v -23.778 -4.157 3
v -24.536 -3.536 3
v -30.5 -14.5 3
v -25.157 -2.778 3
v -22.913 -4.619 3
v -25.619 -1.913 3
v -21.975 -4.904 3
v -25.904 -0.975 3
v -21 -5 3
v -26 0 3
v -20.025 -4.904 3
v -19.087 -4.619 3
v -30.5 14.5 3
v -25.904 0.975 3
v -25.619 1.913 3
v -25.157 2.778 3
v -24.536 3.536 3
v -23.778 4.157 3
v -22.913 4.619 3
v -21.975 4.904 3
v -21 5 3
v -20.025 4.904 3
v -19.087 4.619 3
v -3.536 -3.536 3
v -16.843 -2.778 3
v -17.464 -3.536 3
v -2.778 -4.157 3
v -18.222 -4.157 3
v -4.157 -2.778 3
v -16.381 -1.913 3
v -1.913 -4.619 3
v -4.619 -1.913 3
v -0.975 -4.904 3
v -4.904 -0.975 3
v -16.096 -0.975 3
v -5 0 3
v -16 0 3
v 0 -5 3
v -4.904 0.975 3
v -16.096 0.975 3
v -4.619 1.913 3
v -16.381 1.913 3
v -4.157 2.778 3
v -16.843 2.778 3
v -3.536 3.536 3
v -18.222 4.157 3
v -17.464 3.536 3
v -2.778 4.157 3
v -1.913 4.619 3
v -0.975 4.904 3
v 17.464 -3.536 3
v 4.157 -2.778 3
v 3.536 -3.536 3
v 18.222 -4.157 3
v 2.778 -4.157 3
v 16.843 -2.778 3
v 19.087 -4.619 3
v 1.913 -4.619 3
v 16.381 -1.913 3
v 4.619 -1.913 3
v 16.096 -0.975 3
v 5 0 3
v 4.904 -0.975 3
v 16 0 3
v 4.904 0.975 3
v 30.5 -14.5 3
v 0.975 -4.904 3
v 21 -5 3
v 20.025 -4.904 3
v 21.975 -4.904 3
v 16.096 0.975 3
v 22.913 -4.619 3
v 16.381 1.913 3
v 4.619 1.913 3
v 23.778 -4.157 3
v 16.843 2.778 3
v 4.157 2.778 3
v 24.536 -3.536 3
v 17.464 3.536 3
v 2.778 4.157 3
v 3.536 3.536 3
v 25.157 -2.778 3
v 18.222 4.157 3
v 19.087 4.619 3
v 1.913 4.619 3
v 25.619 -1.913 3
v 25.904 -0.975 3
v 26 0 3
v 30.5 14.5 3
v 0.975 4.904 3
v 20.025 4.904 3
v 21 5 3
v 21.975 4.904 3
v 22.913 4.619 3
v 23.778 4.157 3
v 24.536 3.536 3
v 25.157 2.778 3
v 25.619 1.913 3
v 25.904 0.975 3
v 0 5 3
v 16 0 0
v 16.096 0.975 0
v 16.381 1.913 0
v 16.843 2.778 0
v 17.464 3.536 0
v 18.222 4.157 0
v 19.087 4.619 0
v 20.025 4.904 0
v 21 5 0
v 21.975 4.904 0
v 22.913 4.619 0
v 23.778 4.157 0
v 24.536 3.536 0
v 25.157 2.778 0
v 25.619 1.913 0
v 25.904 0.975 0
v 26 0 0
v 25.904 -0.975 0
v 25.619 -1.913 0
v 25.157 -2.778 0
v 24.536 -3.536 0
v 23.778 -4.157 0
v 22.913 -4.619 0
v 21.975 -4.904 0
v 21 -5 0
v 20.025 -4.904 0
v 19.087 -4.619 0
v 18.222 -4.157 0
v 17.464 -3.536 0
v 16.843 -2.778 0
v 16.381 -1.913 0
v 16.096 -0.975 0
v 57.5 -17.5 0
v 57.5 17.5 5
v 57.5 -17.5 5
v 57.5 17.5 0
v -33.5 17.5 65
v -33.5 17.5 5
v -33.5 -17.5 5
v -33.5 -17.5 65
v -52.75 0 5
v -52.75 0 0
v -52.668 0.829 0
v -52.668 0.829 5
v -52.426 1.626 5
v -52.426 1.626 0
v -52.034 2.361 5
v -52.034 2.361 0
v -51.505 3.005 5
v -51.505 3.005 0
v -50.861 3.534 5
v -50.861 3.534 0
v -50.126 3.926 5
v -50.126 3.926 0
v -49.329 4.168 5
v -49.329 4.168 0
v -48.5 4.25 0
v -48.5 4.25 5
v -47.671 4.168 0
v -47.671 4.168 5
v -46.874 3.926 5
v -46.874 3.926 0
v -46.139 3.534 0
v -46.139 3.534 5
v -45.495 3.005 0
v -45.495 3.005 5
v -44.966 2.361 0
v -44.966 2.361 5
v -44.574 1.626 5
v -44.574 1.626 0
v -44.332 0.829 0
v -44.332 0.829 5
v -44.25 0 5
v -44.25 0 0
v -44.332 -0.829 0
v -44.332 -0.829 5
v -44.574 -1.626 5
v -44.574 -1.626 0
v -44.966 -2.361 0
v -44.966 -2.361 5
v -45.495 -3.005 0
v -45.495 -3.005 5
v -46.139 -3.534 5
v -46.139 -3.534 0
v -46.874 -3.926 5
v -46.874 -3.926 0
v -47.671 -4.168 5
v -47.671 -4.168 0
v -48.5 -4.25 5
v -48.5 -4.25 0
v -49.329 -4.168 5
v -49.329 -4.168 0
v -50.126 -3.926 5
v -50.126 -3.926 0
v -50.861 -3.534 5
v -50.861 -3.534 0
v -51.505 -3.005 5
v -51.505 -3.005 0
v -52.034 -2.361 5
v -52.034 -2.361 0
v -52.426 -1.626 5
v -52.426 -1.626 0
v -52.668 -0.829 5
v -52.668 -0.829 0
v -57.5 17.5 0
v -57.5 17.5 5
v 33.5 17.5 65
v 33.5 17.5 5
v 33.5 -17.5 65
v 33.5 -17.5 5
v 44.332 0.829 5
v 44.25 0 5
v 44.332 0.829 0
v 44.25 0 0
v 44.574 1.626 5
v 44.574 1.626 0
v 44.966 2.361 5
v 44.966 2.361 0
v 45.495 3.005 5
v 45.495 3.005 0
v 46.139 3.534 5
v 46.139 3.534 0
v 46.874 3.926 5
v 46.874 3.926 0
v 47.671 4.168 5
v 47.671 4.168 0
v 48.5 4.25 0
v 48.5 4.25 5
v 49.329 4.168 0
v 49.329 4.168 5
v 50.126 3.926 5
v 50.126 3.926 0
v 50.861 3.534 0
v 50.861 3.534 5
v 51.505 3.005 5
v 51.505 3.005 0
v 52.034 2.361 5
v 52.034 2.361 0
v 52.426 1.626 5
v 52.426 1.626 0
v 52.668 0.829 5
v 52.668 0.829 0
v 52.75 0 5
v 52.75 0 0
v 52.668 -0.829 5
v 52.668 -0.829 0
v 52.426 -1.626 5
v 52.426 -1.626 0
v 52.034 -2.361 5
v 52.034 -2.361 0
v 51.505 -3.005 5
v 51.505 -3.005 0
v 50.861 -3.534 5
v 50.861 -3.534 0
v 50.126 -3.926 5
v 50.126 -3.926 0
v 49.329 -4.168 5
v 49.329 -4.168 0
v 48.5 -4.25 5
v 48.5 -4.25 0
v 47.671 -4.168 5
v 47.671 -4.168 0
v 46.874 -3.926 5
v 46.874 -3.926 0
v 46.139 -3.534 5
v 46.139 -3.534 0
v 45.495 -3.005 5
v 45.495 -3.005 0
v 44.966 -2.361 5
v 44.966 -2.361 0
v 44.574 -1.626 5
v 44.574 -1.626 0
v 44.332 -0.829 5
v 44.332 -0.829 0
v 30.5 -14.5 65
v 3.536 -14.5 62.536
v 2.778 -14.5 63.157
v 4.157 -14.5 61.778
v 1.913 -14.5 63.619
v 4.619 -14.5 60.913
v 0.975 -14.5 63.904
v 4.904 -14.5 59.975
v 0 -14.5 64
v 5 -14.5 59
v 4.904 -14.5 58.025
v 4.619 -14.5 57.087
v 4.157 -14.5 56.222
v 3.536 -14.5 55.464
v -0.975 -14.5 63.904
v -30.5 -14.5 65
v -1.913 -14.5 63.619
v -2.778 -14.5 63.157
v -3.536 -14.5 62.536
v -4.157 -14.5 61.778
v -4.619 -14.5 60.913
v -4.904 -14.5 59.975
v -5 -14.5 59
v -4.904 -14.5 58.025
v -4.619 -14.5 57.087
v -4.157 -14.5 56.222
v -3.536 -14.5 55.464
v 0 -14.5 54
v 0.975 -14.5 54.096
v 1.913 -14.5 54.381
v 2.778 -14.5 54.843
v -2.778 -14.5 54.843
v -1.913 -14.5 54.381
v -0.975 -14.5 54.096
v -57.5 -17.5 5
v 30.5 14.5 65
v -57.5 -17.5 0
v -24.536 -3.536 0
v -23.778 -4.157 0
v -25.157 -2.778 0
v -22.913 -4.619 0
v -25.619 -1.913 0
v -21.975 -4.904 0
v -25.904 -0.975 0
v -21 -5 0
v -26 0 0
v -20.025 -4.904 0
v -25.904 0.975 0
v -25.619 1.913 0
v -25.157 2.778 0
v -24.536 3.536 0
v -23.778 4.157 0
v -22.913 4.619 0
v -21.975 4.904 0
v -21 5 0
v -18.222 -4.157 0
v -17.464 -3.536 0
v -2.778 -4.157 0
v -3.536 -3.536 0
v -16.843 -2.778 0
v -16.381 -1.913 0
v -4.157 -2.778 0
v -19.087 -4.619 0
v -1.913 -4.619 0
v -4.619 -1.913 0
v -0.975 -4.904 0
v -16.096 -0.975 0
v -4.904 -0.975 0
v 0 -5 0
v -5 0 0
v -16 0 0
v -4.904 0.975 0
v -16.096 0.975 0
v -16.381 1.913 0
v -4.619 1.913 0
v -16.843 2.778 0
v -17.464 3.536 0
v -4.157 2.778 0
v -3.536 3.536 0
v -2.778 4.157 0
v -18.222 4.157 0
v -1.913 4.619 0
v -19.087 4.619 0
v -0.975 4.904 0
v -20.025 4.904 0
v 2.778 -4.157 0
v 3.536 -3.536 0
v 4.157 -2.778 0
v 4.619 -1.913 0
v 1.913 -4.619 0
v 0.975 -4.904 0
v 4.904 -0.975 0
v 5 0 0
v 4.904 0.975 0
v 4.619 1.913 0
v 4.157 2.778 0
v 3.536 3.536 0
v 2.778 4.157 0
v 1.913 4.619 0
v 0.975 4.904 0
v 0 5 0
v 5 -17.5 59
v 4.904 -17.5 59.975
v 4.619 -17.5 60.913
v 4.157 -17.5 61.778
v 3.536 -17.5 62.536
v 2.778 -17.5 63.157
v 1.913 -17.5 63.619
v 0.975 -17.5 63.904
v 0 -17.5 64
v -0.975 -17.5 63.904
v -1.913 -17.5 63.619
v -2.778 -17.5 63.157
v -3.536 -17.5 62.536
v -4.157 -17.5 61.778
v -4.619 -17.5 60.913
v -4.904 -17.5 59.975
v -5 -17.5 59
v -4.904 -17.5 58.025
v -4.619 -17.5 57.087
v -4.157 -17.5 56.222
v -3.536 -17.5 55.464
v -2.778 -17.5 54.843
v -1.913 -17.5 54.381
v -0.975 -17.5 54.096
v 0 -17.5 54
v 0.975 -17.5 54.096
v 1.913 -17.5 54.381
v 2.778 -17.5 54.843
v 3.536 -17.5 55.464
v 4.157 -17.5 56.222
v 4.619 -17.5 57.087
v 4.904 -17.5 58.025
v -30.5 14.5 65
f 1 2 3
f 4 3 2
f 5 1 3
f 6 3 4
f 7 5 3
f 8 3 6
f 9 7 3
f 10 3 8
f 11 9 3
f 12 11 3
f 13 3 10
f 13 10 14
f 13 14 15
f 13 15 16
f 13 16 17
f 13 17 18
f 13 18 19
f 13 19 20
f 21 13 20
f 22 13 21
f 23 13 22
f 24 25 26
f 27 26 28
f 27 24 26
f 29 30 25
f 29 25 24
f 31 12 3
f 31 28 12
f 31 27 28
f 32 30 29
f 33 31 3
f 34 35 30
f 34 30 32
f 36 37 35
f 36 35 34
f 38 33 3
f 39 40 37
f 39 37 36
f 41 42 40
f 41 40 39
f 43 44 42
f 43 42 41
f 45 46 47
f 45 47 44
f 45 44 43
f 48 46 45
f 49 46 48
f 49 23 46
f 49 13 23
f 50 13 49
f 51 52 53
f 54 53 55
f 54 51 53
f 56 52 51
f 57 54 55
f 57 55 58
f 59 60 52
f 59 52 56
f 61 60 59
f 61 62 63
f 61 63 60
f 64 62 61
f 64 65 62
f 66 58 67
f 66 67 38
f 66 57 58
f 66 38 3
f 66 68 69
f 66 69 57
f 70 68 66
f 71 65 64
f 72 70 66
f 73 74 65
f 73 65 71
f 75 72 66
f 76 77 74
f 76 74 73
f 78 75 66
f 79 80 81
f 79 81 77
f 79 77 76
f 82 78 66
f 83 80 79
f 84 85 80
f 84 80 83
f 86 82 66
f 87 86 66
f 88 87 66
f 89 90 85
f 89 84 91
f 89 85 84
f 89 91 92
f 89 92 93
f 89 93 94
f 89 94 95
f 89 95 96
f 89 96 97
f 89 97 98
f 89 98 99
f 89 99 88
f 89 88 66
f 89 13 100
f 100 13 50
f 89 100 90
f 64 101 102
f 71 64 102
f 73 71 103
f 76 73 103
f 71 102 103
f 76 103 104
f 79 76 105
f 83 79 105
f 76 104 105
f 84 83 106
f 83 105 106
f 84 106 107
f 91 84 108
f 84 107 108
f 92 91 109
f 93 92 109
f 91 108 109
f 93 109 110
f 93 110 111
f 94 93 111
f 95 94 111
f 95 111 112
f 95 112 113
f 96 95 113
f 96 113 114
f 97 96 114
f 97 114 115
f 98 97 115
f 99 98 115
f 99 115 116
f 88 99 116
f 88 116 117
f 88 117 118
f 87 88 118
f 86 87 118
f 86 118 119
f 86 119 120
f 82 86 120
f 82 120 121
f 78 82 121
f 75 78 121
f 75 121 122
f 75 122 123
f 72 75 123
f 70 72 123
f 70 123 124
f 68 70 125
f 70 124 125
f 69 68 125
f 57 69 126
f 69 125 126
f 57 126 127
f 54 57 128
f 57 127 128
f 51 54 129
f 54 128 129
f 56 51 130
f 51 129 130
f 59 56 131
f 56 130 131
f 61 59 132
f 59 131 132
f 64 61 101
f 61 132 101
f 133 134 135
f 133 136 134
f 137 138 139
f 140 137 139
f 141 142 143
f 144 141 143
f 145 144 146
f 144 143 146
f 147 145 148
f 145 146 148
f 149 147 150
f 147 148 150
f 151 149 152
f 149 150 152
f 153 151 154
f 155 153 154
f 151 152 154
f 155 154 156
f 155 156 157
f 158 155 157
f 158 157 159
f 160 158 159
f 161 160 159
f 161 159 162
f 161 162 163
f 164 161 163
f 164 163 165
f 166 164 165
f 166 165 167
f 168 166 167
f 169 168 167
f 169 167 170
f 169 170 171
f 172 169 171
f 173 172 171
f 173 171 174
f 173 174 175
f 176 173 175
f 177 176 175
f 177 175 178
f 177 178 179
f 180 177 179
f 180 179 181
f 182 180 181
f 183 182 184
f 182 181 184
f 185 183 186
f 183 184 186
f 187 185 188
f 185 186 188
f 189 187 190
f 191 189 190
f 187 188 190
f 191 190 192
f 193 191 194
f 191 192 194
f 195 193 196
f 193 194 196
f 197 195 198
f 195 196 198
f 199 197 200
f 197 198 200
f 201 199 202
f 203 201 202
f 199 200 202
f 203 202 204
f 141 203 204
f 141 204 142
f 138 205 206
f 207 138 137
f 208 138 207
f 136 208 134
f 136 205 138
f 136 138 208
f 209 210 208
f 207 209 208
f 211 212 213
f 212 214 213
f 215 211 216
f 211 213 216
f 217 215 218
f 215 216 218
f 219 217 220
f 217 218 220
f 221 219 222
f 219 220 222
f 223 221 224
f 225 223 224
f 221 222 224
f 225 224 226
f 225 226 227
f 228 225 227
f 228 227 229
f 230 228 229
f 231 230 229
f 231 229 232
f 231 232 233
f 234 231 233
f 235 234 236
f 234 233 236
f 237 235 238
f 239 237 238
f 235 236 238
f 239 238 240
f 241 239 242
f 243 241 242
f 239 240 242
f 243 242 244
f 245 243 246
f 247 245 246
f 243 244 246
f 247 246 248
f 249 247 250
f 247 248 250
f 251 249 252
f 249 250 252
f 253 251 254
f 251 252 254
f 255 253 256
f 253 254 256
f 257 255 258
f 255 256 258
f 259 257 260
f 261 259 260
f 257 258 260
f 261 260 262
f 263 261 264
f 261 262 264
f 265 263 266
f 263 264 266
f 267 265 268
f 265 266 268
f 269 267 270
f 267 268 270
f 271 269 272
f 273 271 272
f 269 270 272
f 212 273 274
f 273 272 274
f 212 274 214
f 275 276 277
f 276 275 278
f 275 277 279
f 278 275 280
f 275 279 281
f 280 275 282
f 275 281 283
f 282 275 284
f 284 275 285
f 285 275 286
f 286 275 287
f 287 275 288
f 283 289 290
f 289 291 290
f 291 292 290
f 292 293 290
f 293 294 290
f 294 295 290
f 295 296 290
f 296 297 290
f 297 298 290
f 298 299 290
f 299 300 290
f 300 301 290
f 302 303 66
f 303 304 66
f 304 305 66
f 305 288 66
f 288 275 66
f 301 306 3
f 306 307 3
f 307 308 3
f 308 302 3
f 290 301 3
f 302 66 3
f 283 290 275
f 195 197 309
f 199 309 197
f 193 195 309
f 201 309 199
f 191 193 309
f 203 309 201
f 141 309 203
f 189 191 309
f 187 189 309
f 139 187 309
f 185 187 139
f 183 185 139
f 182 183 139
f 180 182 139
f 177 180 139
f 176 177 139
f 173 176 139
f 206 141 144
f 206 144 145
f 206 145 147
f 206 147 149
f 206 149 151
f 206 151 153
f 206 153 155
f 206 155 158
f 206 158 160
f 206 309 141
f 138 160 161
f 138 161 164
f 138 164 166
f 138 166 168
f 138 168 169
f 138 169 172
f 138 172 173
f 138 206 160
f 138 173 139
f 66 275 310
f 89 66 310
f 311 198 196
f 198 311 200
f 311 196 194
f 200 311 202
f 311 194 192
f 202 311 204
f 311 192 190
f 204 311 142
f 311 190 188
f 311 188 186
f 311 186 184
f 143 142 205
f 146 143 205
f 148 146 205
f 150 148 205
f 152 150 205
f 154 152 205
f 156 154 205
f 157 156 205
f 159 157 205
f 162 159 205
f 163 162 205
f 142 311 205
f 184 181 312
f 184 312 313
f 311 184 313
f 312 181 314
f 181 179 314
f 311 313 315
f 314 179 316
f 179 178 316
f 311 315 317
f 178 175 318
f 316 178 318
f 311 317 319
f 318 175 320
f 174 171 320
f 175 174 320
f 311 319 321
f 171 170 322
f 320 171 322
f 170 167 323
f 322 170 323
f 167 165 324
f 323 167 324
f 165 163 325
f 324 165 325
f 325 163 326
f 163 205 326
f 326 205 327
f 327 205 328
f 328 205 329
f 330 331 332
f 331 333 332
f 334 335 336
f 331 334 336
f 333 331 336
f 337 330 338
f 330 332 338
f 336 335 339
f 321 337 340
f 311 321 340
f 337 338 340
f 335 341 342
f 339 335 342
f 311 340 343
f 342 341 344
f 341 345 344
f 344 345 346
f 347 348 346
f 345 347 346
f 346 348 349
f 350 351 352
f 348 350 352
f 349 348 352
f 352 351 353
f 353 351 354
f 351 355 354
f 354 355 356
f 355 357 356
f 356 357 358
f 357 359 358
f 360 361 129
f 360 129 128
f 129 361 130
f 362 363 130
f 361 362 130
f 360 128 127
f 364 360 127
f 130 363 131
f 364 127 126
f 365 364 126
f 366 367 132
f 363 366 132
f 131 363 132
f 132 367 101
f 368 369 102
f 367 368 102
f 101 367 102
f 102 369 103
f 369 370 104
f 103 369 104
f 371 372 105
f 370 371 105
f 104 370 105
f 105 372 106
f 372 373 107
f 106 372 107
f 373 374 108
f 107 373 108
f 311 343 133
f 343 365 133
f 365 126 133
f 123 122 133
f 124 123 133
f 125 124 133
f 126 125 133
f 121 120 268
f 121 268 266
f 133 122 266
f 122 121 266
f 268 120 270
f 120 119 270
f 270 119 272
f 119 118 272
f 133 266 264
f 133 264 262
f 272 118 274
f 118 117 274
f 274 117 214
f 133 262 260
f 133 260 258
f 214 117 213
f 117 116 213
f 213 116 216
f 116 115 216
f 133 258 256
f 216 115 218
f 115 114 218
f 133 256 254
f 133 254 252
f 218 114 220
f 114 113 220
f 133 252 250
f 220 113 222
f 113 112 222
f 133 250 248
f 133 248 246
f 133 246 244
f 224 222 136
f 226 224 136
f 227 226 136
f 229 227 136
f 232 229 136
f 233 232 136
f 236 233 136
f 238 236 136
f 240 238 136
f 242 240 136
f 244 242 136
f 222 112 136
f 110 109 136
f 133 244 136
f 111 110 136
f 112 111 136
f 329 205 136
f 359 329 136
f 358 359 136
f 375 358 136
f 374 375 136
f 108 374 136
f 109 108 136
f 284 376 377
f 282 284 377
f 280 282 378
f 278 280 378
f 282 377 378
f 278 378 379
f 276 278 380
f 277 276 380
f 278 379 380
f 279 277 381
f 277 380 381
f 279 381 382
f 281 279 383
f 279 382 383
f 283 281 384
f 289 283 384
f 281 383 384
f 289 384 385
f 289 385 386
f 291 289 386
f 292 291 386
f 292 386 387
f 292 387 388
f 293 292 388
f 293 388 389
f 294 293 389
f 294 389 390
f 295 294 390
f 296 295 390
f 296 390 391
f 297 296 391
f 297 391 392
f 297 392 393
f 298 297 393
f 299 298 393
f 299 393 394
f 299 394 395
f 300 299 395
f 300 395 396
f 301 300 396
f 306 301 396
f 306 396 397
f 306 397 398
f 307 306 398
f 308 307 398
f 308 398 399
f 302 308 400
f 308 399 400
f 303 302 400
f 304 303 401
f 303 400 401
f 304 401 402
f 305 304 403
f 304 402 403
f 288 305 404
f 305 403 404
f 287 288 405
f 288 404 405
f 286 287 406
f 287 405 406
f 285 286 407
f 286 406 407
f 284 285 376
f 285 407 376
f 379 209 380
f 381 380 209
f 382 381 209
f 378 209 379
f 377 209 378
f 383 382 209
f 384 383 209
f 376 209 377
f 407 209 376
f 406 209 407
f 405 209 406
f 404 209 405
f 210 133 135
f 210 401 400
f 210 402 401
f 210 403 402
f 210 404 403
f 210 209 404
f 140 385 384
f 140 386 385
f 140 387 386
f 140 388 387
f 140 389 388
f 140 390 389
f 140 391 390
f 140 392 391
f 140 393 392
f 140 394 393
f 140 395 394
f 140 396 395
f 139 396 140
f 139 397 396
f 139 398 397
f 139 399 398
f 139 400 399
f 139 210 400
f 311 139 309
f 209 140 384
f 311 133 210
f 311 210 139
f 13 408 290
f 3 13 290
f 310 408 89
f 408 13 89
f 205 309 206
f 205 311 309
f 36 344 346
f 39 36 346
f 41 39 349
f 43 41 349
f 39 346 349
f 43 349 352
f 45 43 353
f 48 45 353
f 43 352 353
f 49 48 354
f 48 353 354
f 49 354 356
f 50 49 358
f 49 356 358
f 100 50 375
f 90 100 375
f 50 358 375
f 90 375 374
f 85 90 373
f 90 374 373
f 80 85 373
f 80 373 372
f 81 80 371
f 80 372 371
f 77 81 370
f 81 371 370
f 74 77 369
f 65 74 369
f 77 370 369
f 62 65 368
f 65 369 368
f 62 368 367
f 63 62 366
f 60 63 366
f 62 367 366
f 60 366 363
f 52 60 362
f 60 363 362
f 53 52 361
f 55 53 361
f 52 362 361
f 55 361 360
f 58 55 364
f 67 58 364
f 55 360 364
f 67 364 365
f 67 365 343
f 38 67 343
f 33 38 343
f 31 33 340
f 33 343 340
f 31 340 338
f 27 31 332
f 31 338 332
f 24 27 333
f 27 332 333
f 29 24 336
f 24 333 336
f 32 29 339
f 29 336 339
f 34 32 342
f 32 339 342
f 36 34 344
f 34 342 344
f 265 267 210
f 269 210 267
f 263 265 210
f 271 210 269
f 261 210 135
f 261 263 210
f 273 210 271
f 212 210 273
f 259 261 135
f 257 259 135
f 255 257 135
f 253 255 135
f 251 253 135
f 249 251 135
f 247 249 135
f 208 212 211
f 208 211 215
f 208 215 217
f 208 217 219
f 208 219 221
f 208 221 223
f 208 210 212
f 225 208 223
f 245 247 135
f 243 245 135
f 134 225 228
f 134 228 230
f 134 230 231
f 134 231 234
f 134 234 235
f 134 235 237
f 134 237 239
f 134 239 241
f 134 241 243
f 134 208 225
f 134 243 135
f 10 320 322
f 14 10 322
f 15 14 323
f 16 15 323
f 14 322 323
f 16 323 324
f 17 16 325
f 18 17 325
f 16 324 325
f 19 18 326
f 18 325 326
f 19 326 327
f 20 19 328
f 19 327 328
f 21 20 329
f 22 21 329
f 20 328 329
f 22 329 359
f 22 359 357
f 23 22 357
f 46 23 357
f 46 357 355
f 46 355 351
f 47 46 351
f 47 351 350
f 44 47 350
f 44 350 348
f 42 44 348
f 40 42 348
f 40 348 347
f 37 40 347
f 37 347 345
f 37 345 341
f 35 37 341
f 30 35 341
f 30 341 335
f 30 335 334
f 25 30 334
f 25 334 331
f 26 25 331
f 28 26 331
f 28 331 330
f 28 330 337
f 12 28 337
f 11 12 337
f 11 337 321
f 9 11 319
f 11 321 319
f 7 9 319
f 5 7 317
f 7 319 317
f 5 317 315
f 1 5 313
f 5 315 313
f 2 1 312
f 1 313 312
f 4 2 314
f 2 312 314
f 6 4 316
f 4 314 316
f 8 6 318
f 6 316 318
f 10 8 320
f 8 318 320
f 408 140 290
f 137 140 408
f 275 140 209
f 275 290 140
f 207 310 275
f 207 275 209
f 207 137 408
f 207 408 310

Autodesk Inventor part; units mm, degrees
ref_plane "YZ Plane" through (0, 0, 0) normal (1, 0, 0) x (0, 1, 0)
ref_plane "XZ Plane" through (0, 0, 0) normal (0, 1, 0) x (-1, 0, 0)
ref_plane "XY Plane" through (0, 0, 0) normal (0, 0, 1) x (1, 0, 0)
sketch "Sketch1" plane through (0, 0, 0) normal (0, 0, 1) x (1, 0, 0)
  line L0 (-57.5, 17.5) -> (57.5, 17.5)
  line L1 (57.5, 17.5) -> (57.5, -17.5)
  line L2 (57.5, -17.5) -> (-57.5, -17.5)
  line L3 (-57.5, -17.5) -> (-57.5, 17.5)
  line L4 (-57.5, 17.5) -> (57.5, -17.5) construction
  line L5 (57.5, 17.5) -> (-57.5, -17.5) construction
  point P0 (0, 0)
  dimension "d0" = 115
  dimension "d1" = 35
extrude "Extrusion1" add sketch "Sketch1" along normal blind 5
sketch "Sketch2" plane through (0, 0, 5) normal (0, 0, 1) x (1, 0, 0)
  line L0 (57.5, 17.5) -> (-57.5, 17.5) projected
  line L1 (-33.5, -17.5) -> (33.5, -17.5)
  line L2 (33.5, -17.5) -> (33.5, 17.5)
  line L3 (33.5, 17.5) -> (-33.5, 17.5)
  line L4 (-33.5, 17.5) -> (-33.5, -17.5)
  line L5 (-33.5, -17.5) -> (33.5, 17.5) construction
  line L6 (33.5, -17.5) -> (-33.5, 17.5) construction
  point P0 (0, 0)
  dimension "d10" = 67
extrude "Extrusion2" add sketch "Sketch2" along normal blind 60
shell "Shell1" thickness 3 removed faces 1 at (11.1667, -5.8333, 65)
sketch "Sketch3" plane through (0, 0, 0) normal (0, 0, -1) x (-1, 0, 0)
  circle A0 centre (0, 0) radius 5
  circle A1 centre (21, 0) radius 5
  circle A2 centre (-21, 0) radius 5
  circle A3 centre (48.5, 0) radius 4.25
  circle A4 centre (-48.5, 0) radius 4.25
  line L0 (-57.5, -17.5) -> (-57.5, 17.5) projected
  line L1 (57.5, 17.5) -> (57.5, -17.5) projected
  dimension "d14" = 10
  dimension "d15" = 10
  dimension "d16" = 10
  dimension "d17" = 21
  dimension "d18" = 21
  dimension "d19" = 8.5
  dimension "d20" = 8.5
  dimension "d21" = 97
  dimension "d22" = 9
  dimension "d23" = 9
extrude "Extrusion3" cut sketch "Sketch3" against normal through all
sketch "Sketch4" plane through (-57.5, -17.5, 0) normal (0, -1, 0) x (1, 0, 0)
  point P0 (57.5, 0)
sketch "Sketch5" plane through (-57.5, -17.5, 0) normal (0, -1, 0) x (1, 0, 0)
  circle A0 centre (57.5, 59) radius 5
  line L0 (24, 65) -> (91, 65) projected
  point P0 (57.5, 0)
  dimension "d26" = 10
  dimension "d27" = 6
extrude "Extrusion4" cut sketch "Sketch5" against normal blind 3
properties part number "BASE"
